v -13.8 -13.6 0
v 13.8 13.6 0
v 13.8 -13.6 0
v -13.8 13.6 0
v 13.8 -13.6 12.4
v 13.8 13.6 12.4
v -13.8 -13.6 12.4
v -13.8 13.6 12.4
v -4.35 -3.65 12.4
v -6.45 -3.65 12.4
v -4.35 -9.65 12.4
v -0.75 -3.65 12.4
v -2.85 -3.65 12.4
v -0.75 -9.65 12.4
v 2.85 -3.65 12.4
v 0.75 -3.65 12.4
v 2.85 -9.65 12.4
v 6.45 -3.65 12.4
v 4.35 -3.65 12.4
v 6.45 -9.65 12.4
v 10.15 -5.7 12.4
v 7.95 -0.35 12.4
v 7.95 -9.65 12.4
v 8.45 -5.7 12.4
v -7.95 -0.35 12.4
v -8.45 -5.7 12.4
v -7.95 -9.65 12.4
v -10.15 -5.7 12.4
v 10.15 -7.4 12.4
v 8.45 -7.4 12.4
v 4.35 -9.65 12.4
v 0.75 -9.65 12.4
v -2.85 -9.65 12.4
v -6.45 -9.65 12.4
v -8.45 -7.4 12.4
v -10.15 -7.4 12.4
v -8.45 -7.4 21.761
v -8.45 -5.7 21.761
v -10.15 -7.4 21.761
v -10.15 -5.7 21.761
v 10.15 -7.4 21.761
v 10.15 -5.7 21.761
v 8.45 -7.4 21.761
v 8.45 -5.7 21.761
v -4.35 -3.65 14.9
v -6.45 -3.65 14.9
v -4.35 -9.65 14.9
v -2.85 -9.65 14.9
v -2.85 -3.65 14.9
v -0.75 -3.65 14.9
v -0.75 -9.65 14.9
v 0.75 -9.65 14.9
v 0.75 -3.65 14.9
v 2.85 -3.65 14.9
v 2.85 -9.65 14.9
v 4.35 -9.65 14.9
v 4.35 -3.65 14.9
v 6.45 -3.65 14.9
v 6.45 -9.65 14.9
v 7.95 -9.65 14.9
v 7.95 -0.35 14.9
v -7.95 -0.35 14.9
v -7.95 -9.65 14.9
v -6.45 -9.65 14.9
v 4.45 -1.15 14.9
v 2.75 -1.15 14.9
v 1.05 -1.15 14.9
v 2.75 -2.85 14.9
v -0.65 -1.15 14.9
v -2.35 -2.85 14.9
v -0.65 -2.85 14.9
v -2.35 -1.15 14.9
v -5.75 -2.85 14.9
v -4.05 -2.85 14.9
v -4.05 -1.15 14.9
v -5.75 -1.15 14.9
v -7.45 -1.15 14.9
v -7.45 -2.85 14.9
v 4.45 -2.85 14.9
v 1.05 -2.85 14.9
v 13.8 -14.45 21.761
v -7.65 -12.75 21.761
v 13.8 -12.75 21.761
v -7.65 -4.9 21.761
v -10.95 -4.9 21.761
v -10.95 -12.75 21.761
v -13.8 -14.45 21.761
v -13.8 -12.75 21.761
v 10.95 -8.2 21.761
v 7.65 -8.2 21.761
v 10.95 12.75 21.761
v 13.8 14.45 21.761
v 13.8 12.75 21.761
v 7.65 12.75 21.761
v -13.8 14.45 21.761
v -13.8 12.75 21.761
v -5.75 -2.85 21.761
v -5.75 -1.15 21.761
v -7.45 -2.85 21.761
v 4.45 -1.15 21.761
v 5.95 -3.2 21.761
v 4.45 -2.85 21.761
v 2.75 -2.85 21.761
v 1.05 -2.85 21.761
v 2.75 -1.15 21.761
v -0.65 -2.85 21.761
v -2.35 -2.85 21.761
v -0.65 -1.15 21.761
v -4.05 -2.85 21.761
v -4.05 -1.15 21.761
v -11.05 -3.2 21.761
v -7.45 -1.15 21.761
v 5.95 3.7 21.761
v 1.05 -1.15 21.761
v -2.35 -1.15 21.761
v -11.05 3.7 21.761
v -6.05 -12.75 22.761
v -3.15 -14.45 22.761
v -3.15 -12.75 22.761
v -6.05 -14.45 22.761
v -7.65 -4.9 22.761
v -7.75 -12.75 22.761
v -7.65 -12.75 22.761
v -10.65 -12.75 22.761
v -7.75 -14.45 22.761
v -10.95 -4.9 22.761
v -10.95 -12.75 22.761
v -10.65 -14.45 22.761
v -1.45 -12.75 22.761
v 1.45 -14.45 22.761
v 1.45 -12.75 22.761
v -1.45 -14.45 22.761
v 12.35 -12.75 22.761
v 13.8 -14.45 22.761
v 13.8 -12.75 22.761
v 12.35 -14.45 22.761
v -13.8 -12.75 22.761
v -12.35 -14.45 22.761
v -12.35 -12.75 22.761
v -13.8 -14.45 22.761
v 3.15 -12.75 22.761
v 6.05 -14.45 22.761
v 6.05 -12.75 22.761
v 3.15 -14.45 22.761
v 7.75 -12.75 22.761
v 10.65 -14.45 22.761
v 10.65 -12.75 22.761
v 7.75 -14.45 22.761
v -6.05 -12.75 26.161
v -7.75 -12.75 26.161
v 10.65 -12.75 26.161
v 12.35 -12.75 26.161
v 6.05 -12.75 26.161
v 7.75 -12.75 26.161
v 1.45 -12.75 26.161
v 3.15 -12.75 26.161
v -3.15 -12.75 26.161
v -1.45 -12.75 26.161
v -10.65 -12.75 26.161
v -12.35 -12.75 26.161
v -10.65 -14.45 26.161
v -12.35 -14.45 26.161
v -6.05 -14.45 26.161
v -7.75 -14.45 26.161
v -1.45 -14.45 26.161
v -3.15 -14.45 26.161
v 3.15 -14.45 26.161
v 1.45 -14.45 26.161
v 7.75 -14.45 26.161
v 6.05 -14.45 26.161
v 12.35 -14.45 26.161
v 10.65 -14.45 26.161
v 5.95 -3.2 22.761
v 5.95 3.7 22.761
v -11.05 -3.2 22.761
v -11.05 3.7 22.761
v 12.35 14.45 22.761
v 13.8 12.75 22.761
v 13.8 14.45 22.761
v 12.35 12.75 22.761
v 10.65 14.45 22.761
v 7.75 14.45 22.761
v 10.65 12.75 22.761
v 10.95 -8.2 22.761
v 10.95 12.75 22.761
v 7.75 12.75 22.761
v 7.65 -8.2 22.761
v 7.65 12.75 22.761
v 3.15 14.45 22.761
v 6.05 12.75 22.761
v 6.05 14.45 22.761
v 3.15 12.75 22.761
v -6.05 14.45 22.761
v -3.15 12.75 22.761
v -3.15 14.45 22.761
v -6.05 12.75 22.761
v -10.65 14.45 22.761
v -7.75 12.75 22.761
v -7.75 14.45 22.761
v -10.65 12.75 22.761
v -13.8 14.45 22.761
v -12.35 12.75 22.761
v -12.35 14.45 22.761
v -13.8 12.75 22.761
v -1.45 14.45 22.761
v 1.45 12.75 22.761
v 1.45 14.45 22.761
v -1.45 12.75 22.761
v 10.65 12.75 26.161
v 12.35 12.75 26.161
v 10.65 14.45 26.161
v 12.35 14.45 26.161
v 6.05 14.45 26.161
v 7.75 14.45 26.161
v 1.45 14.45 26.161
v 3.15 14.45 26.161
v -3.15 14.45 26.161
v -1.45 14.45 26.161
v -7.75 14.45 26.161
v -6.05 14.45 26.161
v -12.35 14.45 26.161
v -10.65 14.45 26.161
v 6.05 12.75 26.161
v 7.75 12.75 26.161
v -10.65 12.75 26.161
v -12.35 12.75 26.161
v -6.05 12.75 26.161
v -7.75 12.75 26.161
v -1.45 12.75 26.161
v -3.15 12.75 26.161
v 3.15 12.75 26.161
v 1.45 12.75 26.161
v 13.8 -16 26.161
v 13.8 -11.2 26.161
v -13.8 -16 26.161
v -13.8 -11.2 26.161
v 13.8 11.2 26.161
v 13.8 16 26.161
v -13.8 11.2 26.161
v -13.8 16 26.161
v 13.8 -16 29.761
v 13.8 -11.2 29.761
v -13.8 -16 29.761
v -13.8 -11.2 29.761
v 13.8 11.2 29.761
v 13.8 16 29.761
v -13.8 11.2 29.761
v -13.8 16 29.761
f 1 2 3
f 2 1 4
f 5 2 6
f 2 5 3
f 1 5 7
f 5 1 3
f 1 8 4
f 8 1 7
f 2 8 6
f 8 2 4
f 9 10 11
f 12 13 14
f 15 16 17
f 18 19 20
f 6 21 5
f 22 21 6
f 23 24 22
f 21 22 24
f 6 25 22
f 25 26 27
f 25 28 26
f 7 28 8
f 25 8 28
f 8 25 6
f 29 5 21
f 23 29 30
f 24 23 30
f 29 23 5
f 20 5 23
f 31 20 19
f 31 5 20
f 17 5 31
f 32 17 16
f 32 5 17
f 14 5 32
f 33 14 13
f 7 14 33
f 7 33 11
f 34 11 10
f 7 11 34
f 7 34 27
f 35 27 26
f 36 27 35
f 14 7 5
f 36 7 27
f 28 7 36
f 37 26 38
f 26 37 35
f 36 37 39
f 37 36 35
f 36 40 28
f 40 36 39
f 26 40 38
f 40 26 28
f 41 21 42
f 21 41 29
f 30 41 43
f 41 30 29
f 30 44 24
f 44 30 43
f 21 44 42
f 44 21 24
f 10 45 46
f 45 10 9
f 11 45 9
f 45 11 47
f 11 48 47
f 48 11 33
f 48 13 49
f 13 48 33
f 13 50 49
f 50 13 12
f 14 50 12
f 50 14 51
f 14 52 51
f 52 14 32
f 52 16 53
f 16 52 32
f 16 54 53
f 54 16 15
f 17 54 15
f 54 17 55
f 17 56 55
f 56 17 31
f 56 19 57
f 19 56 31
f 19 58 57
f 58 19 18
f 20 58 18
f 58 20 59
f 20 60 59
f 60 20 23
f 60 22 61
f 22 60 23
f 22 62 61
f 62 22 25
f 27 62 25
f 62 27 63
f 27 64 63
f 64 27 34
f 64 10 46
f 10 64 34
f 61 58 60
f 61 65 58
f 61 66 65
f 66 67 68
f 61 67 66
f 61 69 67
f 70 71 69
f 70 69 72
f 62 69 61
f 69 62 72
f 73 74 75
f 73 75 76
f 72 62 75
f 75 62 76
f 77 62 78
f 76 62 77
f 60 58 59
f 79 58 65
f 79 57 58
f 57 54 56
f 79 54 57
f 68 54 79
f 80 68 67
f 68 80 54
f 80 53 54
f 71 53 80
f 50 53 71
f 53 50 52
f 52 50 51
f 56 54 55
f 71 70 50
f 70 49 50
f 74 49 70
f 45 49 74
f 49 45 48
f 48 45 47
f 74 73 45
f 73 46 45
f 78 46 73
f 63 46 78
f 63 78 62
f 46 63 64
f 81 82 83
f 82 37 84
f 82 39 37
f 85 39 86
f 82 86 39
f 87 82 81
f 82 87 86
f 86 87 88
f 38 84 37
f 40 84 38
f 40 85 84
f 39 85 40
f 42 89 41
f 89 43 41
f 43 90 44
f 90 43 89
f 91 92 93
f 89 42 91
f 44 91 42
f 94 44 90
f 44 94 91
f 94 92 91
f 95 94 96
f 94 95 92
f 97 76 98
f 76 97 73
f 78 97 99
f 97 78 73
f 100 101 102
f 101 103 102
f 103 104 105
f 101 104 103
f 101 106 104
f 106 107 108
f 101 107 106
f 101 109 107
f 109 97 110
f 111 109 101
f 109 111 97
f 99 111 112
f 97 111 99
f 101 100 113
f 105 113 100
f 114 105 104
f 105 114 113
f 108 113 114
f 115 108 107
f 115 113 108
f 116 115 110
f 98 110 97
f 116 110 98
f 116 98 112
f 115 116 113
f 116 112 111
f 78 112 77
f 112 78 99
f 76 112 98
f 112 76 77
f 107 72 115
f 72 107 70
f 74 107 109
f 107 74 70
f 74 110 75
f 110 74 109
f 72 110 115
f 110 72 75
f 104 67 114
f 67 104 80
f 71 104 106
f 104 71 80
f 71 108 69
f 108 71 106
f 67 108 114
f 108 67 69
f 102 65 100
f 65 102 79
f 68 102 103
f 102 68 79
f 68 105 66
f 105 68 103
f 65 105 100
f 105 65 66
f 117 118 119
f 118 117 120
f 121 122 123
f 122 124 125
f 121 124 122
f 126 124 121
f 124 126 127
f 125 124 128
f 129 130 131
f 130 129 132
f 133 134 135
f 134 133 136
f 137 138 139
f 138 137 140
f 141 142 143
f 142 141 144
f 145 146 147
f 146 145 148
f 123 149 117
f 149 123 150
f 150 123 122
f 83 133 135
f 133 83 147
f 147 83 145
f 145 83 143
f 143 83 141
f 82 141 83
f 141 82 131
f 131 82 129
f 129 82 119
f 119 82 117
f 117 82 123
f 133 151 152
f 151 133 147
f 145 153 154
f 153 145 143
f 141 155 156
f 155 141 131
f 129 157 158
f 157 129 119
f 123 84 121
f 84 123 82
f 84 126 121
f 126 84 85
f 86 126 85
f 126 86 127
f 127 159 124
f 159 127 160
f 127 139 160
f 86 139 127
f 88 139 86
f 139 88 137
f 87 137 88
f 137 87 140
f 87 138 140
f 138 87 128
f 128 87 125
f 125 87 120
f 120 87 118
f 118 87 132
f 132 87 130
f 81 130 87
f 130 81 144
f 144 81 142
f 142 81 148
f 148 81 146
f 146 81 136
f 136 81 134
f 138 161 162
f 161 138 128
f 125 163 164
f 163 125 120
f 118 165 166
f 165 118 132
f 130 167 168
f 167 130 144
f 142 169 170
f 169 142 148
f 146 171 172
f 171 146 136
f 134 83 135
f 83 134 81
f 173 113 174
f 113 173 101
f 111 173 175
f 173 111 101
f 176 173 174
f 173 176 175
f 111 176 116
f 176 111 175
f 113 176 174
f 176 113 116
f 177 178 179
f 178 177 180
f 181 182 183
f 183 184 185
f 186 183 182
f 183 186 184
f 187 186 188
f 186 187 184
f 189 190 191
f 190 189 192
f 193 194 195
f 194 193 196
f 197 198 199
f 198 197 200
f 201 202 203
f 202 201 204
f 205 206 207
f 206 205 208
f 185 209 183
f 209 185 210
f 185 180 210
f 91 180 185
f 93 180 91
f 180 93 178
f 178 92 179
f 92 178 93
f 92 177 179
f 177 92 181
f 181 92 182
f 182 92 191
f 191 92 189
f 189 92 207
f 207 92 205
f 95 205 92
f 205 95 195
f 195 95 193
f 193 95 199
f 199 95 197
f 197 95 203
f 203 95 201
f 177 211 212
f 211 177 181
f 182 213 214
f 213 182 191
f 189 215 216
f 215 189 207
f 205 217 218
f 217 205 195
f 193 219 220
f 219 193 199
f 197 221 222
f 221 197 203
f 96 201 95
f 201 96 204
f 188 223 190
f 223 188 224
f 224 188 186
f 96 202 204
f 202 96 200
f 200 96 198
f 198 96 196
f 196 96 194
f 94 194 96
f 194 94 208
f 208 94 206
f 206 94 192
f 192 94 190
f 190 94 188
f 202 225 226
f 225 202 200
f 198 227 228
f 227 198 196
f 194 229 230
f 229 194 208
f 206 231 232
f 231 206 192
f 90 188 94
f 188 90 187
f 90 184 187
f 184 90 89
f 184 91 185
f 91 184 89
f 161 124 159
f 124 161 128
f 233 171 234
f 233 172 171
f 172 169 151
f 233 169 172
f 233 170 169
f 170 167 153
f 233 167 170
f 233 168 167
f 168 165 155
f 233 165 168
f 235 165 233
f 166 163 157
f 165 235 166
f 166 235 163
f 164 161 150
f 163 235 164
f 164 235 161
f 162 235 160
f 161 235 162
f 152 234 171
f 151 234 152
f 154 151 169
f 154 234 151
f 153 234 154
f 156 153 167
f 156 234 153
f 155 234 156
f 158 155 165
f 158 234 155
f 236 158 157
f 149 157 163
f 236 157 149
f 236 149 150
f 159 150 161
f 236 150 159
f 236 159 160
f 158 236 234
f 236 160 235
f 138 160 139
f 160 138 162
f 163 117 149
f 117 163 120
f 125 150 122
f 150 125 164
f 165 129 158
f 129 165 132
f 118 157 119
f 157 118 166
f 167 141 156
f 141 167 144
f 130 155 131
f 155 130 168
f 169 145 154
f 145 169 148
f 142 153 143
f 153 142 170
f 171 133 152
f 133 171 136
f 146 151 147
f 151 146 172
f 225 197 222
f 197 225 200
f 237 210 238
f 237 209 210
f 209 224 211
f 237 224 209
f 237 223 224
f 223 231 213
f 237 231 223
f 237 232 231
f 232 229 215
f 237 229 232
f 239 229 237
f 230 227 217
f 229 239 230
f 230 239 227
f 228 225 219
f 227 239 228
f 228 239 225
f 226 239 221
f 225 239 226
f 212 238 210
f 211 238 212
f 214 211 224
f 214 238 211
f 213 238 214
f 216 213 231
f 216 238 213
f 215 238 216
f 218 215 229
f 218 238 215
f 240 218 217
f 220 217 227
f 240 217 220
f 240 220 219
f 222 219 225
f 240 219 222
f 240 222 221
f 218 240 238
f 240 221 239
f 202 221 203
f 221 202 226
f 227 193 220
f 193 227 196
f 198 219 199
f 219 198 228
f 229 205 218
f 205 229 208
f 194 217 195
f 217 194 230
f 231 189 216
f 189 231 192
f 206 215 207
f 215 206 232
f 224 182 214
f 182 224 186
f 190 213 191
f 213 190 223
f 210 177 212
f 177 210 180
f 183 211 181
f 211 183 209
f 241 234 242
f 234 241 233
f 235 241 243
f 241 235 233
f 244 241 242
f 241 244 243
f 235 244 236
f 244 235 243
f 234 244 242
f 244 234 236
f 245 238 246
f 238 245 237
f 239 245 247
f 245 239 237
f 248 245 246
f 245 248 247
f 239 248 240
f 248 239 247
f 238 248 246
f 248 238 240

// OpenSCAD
// Generated by SolidPython 0.4.2 on 2020-09-29 23:21:00
//!OpenSCAD

scale(v = 0.0100000000) {
	translate(v = [-1380, -1360, 0]) {
		union() {
			color(c = [0.4000000000, 0.4000000000, 0.4000000000]) {
				translate(v = [0, 0, 0]) {
					linear_extrude(height = 1000.0000000000) {
						polygon(paths = [[0, 1, 2, 3]], points = [[0, 0], [0, 2720], [2760, 2720], [2760, 0]]);
					}
				}
			}
			color(c = [0.2000000000, 0.6000000000, 0.2000000000]) {
				translate(v = [0, 0, 1000.0000000000]) {
					linear_extrude(height = 120.0000000000) {
						polygon(paths = [[0, 1, 2, 3]], points = [[0, 1305], [0, 2720], [2760, 2720], [2760, 1305]]);
					}
				}
			}
			color(c = [0.4000000000, 0.4000000000, 0.4000000000]) {
				translate(v = [0, 0, 1000.0000000000]) {
					linear_extrude(height = 120.0000000000) {
						polygon(paths = [[0, 1, 2, 3]], points = [[0, 0], [0, 1305], [2760, 1305], [2760, 0]]);
					}
				}
			}
			color(c = [0.9000000000, 0.6000000000, 0.9000000000]) {
				translate(v = [0, 0, 1120.0000000000]) {
					linear_extrude(height = 120.0000000000) {
						polygon(paths = [[0, 1, 2, 3]], points = [[325, 525], [325, 885], [585, 885], [585, 525]]);
					}
				}
			}
			color(c = [0.9000000000, 0.6000000000, 0.9000000000]) {
				translate(v = [0, 0, 1120.0000000000]) {
					linear_extrude(height = 120.0000000000) {
						polygon(paths = [[0, 1, 2, 3]], points = [[735, 525], [735, 885], [945, 885], [945, 525]]);
					}
				}
			}
			color(c = [0.9000000000, 0.6000000000, 0.9000000000]) {
				translate(v = [0, 0, 1120.0000000000]) {
					linear_extrude(height = 120.0000000000) {
						polygon(paths = [[0, 1, 2, 3]], points = [[1095, 525], [1095, 885], [1305, 885], [1305, 525]]);
					}
				}
			}
			color(c = [0.9000000000, 0.6000000000, 0.9000000000]) {
				translate(v = [0, 0, 1120.0000000000]) {
					linear_extrude(height = 120.0000000000) {
						polygon(paths = [[0, 1, 2, 3]], points = [[1455, 525], [1455, 885], [1665, 885], [1665, 525]]);
					}
				}
			}
			color(c = [0.9000000000, 0.6000000000, 0.9000000000]) {
				translate(v = [0, 0, 1120.0000000000]) {
					linear_extrude(height = 120.0000000000) {
						polygon(paths = [[0, 1, 2, 3]], points = [[1815, 525], [1815, 885], [2025, 885], [2025, 525]]);
					}
				}
			}
			color(c = [0.9000000000, 0.6000000000, 0.9000000000]) {
				translate(v = [0, 0, 1120.0000000000]) {
					linear_extrude(height = 120.0000000000) {
						polygon(paths = [[0, 1, 2, 3]], points = [[2175, 525], [2175, 885], [2435, 885], [2435, 525]]);
					}
				}
			}
			color(c = [0.2000000000, 0.6000000000, 0.2000000000]) {
				translate(v = [0, 0, 1120.0000000000]) {
					linear_extrude(height = 120.0000000000) {
						polygon(paths = [[0, 1, 2, 3]], points = [[0, 1305], [0, 2720], [2760, 2720], [2760, 1305]]);
					}
				}
			}
			color(c = [0.4000000000, 0.4000000000, 0.4000000000]) {
				translate(v = [0, 0, 1120.0000000000]) {
					linear_extrude(height = 120.0000000000) {
						difference() {
							polygon(paths = [[0, 1, 2, 3]], points = [[0, 0], [0, 1305], [2760, 1305], [2760, 0]]);
							polygon(paths = [[0, 1, 2, 3]], points = [[325, 525], [585, 525], [585, 885], [325, 885]]);
							polygon(paths = [[0, 1, 2, 3]], points = [[735, 525], [945, 525], [945, 885], [735, 885]]);
							polygon(paths = [[0, 1, 2, 3]], points = [[1095, 525], [1305, 525], [1305, 885], [1095, 885]]);
							polygon(paths = [[0, 1, 2, 3]], points = [[1455, 525], [1665, 525], [1665, 885], [1455, 885]]);
							polygon(paths = [[0, 1, 2, 3]], points = [[1815, 525], [2025, 525], [2025, 885], [1815, 885]]);
							polygon(paths = [[0, 1, 2, 3]], points = [[2175, 525], [2435, 525], [2435, 885], [2175, 885]]);
						}
					}
				}
			}
			color(c = [0.1000000000, 0.1000000000, 0.1000000000]) {
				translate(v = [0, 0, 1240.0000000000]) {
					linear_extrude(height = 70.0000000000) {
						polygon(paths = [[0, 1, 2, 3]], points = [[365, 620], [365, 790], [535, 790], [535, 620]]);
					}
				}
			}
			color(c = [0.1000000000, 0.1000000000, 0.1000000000]) {
				translate(v = [0, 0, 1240.0000000000]) {
					linear_extrude(height = 70.0000000000) {
						polygon(paths = [[0, 1, 2, 3]], points = [[2225, 620], [2225, 790], [2395, 790], [2395, 620]]);
					}
				}
			}
			color(c = [1.0000000000, 1.0000000000, 1.0000000000]) {
				translate(v = [0, 0, 1240.0000000000]) {
					linear_extrude(height = 70.0000000000) {
						polygon(paths = [[0, 1, 2, 3, 4, 5, 6, 7, 8, 9, 10, 11, 12, 13, 14, 15, 16, 17, 18, 19]], points = [[585, 395], [585, 1325], [2175, 1325], [2175, 395], [2025, 395], [2025, 995], [1815, 995], [1815, 395], [1665, 395], [1665, 995], [1455, 995], [1455, 395], [1305, 395], [1305, 995], [1095, 995], [1095, 395], [945, 395], [945, 995], [735, 995], [735, 395]]);
					}
				}
			}
			color(c = [0.1000000000, 0.1000000000, 0.1000000000]) {
				translate(v = [0, 0, 1310.0000000000]) {
					linear_extrude(height = 180.0000000000) {
						polygon(paths = [[0, 1, 2, 3]], points = [[365, 620], [365, 790], [535, 790], [535, 620]]);
					}
				}
			}
			color(c = [0.1000000000, 0.1000000000, 0.1000000000]) {
				translate(v = [0, 0, 1310.0000000000]) {
					linear_extrude(height = 180.0000000000) {
						polygon(paths = [[0, 1, 2, 3]], points = [[2225, 620], [2225, 790], [2395, 790], [2395, 620]]);
					}
				}
			}
			color(c = [0.7000000000, 0, 0]) {
				translate(v = [0, 0, 1310.0000000000]) {
					linear_extrude(height = 180.0000000000) {
						polygon(paths = [[0, 1, 2, 3, 4, 5, 6, 7, 8, 9, 10, 11, 12, 13, 14, 15, 16, 17, 18, 19]], points = [[585, 395], [585, 1325], [2175, 1325], [2175, 395], [2025, 395], [2025, 995], [1815, 995], [1815, 395], [1665, 395], [1665, 995], [1455, 995], [1455, 395], [1305, 395], [1305, 995], [1095, 995], [1095, 395], [945, 395], [945, 995], [735, 995], [735, 395]]);
					}
				}
			}
			color(c = [0.1000000000, 0.1000000000, 0.1000000000]) {
				translate(v = [0, 0, 1490.0000000000]) {
					linear_extrude(height = 686.1000000000) {
						polygon(paths = [[0, 1, 2, 3]], points = [[365, 620], [365, 790], [535, 790], [535, 620]]);
					}
				}
			}
			color(c = [0.1000000000, 0.1000000000, 0.1000000000]) {
				translate(v = [0, 0, 1490.0000000000]) {
					linear_extrude(height = 686.1000000000) {
						polygon(paths = [[0, 1, 2, 3]], points = [[2225, 620], [2225, 790], [2395, 790], [2395, 620]]);
					}
				}
			}
			color(c = [0.1000000000, 0.1000000000, 0.1000000000]) {
				translate(v = [0, 0, 1490.0000000000]) {
					linear_extrude(height = 686.1000000000) {
						polygon(paths = [[0, 1, 2, 3]], points = [[635, 1075], [635, 1245], [805, 1245], [805, 1075]]);
					}
				}
			}
			color(c = [0.1000000000, 0.1000000000, 0.1000000000]) {
				translate(v = [0, 0, 1490.0000000000]) {
					linear_extrude(height = 686.1000000000) {
						polygon(paths = [[0, 1, 2, 3]], points = [[975, 1075], [975, 1245], [1145, 1245], [1145, 1075]]);
					}
				}
			}
			color(c = [0.1000000000, 0.1000000000, 0.1000000000]) {
				translate(v = [0, 0, 1490.0000000000]) {
					linear_extrude(height = 686.1000000000) {
						polygon(paths = [[0, 1, 2, 3]], points = [[1315, 1075], [1315, 1245], [1485, 1245], [1485, 1075]]);
					}
				}
			}
			color(c = [0.1000000000, 0.1000000000, 0.1000000000]) {
				translate(v = [0, 0, 1490.0000000000]) {
					linear_extrude(height = 686.1000000000) {
						polygon(paths = [[0, 1, 2, 3]], points = [[1655, 1075], [1655, 1245], [1825, 1245], [1825, 1075]]);
					}
				}
			}
			color(c = [0.9000000000, 0.6000000000, 0.6000000000]) {
				translate(v = [0, 0, 2176.1000000000]) {
					linear_extrude(height = 100.0000000000) {
						polygon(paths = [[0, 1, 2, 3, 4, 5, 6, 7]], points = [[0, -85], [0, 85], [285, 85], [285, 870], [615, 870], [615, 85], [2760, 85], [2760, -85]]);
					}
				}
			}
			color(c = [0.9000000000, 0.6000000000, 0.6000000000]) {
				translate(v = [0, 0, 2176.1000000000]) {
					linear_extrude(height = 100.0000000000) {
						polygon(paths = [[0, 1, 2, 3]], points = [[275, 1040], [275, 1730], [1975, 1730], [1975, 1040]]);
					}
				}
			}
			color(c = [0.9000000000, 0.6000000000, 0.6000000000]) {
				translate(v = [0, 0, 2176.1000000000]) {
					linear_extrude(height = 100.0000000000) {
						polygon(paths = [[0, 1, 2, 3, 4, 5, 6, 7]], points = [[2145, 540], [2145, 2635], [0, 2635], [0, 2805], [2760, 2805], [2760, 2635], [2475, 2635], [2475, 540]]);
					}
				}
			}
			color(c = [0.5000000000, 0.5000000000, 0.5000000000]) {
				translate(v = [0, 0, 2276.1000000000]) {
					linear_extrude(height = 340.0000000000) {
						polygon(paths = [[0, 1, 2, 3]], points = [[145, -85], [145, 85], [315, 85], [315, -85]]);
					}
				}
			}
			color(c = [0.5000000000, 0.5000000000, 0.5000000000]) {
				translate(v = [0, 0, 2276.1000000000]) {
					linear_extrude(height = 340.0000000000) {
						polygon(paths = [[0, 1, 2, 3]], points = [[605, -85], [605, 85], [775, 85], [775, -85]]);
					}
				}
			}
			color(c = [0.5000000000, 0.5000000000, 0.5000000000]) {
				translate(v = [0, 0, 2276.1000000000]) {
					linear_extrude(height = 340.0000000000) {
						polygon(paths = [[0, 1, 2, 3]], points = [[1065, -85], [1065, 85], [1235, 85], [1235, -85]]);
					}
				}
			}
			color(c = [0.5000000000, 0.5000000000, 0.5000000000]) {
				translate(v = [0, 0, 2276.1000000000]) {
					linear_extrude(height = 340.0000000000) {
						polygon(paths = [[0, 1, 2, 3]], points = [[1525, -85], [1525, 85], [1695, 85], [1695, -85]]);
					}
				}
			}
			color(c = [0.5000000000, 0.5000000000, 0.5000000000]) {
				translate(v = [0, 0, 2276.1000000000]) {
					linear_extrude(height = 340.0000000000) {
						polygon(paths = [[0, 1, 2, 3]], points = [[1985, -85], [1985, 85], [2155, 85], [2155, -85]]);
					}
				}
			}
			color(c = [0.5000000000, 0.5000000000, 0.5000000000]) {
				translate(v = [0, 0, 2276.1000000000]) {
					linear_extrude(height = 340.0000000000) {
						polygon(paths = [[0, 1, 2, 3]], points = [[2445, -85], [2445, 85], [2615, 85], [2615, -85]]);
					}
				}
			}
			color(c = [0.5000000000, 0.5000000000, 0.5000000000]) {
				translate(v = [0, 0, 2276.1000000000]) {
					linear_extrude(height = 340.0000000000) {
						polygon(paths = [[0, 1, 2, 3]], points = [[145, 2635], [145, 2805], [315, 2805], [315, 2635]]);
					}
				}
			}
			color(c = [0.5000000000, 0.5000000000, 0.5000000000]) {
				translate(v = [0, 0, 2276.1000000000]) {
					linear_extrude(height = 340.0000000000) {
						polygon(paths = [[0, 1, 2, 3]], points = [[605, 2635], [605, 2805], [775, 2805], [775, 2635]]);
					}
				}
			}
			color(c = [0.5000000000, 0.5000000000, 0.5000000000]) {
				translate(v = [0, 0, 2276.1000000000]) {
					linear_extrude(height = 340.0000000000) {
						polygon(paths = [[0, 1, 2, 3]], points = [[1065, 2635], [1065, 2805], [1235, 2805], [1235, 2635]]);
					}
				}
			}
			color(c = [0.5000000000, 0.5000000000, 0.5000000000]) {
				translate(v = [0, 0, 2276.1000000000]) {
					linear_extrude(height = 340.0000000000) {
						polygon(paths = [[0, 1, 2, 3]], points = [[1525, 2635], [1525, 2805], [1695, 2805], [1695, 2635]]);
					}
				}
			}
			color(c = [0.5000000000, 0.5000000000, 0.5000000000]) {
				translate(v = [0, 0, 2276.1000000000]) {
					linear_extrude(height = 340.0000000000) {
						polygon(paths = [[0, 1, 2, 3]], points = [[1985, 2635], [1985, 2805], [2155, 2805], [2155, 2635]]);
					}
				}
			}
			color(c = [0.5000000000, 0.5000000000, 0.5000000000]) {
				translate(v = [0, 0, 2276.1000000000]) {
					linear_extrude(height = 340.0000000000) {
						polygon(paths = [[0, 1, 2, 3]], points = [[2445, 2635], [2445, 2805], [2615, 2805], [2615, 2635]]);
					}
				}
			}
			color(c = [0.3000000000, 0.3000000000, 1]) {
				translate(v = [0, 0, 2616.1000000000]) {
					linear_extrude(height = 360.0000000000) {
						polygon(paths = [[0, 1, 2, 3]], points = [[0, -240], [0, 240], [2760, 240], [2760, -240]]);
					}
				}
			}
			color(c = [0.3000000000, 0.3000000000, 1]) {
				translate(v = [0, 0, 2616.1000000000]) {
					linear_extrude(height = 360.0000000000) {
						polygon(paths = [[0, 1, 2, 3]], points = [[0, 2480], [0, 2960], [2760, 2960], [2760, 2480]]);
					}
				}
			}
		}
	}
}
